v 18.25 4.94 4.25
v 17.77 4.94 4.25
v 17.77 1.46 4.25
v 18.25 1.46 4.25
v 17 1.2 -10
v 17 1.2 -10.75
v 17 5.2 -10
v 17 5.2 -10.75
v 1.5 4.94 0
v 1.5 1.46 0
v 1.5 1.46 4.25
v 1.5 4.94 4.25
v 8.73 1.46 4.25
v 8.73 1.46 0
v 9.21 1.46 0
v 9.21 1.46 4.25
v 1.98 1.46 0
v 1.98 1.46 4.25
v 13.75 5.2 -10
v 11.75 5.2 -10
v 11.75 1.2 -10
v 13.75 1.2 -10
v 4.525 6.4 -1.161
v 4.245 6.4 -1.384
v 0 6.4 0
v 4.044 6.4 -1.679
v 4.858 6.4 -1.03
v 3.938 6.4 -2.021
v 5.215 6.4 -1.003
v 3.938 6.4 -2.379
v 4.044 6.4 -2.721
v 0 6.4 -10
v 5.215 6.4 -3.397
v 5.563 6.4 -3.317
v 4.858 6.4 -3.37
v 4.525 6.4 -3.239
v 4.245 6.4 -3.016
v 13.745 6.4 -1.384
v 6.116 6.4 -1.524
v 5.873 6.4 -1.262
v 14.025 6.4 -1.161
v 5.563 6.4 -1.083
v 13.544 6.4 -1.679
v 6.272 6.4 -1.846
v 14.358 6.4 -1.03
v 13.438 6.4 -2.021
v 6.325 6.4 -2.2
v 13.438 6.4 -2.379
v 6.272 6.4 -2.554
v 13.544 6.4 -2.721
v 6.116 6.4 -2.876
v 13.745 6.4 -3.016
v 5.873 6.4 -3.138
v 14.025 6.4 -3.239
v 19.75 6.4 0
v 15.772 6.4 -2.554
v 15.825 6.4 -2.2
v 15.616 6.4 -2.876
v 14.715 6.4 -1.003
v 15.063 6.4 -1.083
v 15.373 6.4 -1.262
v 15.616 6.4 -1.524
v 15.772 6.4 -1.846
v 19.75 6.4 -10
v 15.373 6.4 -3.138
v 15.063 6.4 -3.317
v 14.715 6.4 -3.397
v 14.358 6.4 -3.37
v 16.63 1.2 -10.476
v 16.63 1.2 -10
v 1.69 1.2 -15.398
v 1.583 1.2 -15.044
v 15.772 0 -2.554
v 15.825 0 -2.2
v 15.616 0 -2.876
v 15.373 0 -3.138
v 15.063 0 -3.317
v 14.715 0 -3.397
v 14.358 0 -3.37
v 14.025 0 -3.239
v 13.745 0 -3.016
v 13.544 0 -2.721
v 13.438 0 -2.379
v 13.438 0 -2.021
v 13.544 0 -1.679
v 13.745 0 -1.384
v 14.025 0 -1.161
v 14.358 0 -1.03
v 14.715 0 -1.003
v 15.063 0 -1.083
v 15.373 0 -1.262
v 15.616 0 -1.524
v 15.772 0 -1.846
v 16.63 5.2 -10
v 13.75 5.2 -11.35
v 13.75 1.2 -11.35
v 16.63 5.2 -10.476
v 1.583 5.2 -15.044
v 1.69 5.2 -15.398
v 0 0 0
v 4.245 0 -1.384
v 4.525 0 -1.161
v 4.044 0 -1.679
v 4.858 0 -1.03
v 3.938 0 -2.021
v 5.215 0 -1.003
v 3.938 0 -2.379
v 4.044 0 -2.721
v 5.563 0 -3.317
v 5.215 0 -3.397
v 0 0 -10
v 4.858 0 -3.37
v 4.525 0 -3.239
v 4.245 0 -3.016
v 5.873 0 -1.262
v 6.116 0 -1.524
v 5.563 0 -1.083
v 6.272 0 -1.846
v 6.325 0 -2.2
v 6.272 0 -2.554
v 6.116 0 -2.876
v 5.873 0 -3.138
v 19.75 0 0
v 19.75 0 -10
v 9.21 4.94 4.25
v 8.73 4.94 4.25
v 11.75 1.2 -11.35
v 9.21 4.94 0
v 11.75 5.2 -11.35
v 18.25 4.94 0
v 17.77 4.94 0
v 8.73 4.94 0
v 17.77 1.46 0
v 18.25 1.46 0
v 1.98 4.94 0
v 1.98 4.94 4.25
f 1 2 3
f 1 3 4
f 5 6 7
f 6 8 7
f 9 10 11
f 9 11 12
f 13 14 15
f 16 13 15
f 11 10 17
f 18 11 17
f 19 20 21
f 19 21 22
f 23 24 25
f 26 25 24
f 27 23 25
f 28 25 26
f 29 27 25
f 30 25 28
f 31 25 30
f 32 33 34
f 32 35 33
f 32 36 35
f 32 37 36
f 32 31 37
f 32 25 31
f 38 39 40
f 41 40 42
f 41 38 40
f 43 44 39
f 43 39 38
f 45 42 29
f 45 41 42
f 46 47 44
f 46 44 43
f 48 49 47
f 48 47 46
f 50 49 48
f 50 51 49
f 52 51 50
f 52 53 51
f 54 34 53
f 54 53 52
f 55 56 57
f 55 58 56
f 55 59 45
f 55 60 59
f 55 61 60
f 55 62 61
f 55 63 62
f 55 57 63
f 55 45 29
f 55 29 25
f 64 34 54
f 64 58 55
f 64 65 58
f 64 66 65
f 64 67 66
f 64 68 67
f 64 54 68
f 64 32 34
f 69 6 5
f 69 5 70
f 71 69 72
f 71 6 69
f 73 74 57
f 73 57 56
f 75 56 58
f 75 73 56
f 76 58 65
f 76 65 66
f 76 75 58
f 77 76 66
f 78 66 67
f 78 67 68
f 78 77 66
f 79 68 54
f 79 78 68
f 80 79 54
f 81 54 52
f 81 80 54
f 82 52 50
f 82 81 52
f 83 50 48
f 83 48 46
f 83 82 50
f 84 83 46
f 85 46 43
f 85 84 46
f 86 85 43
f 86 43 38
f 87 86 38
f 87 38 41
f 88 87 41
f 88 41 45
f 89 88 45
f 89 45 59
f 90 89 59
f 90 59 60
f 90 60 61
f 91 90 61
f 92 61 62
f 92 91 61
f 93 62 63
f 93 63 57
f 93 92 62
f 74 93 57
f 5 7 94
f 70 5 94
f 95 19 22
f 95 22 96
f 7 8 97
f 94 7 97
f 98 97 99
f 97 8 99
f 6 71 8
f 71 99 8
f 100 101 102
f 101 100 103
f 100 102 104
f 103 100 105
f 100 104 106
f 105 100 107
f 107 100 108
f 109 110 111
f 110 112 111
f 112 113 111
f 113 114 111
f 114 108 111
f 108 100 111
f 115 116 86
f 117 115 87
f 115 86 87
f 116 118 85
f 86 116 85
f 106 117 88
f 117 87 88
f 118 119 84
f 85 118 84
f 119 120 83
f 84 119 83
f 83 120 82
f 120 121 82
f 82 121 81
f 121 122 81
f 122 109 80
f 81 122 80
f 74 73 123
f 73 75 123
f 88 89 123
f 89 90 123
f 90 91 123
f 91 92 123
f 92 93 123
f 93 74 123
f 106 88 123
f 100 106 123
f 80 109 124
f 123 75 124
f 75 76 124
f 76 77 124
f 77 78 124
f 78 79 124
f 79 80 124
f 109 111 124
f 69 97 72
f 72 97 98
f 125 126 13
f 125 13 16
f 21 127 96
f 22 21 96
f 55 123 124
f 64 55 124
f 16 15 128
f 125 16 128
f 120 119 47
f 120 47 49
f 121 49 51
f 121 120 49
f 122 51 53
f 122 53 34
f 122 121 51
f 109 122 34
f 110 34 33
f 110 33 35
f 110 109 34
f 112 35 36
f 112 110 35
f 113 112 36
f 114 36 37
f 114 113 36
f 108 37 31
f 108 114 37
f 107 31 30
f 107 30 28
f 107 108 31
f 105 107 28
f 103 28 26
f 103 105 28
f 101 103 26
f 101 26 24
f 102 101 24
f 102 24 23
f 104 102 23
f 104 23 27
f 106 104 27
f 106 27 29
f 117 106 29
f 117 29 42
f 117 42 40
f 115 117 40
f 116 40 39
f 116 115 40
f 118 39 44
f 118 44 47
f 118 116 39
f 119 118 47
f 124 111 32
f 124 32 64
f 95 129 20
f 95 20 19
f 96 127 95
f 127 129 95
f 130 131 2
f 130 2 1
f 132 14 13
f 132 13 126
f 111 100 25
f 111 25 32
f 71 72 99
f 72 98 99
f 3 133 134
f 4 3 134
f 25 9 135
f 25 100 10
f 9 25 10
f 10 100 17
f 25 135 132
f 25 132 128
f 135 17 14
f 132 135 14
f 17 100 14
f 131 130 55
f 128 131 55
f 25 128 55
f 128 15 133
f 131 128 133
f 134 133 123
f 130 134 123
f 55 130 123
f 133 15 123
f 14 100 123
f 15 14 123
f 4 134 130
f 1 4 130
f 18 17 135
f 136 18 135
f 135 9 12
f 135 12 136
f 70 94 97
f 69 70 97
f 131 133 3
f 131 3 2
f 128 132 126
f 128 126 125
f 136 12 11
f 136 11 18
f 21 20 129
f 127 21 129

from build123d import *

# Parameters (mm, degrees)
SKETCH2_W                  = 19.75
SKETCH2_H                  = 10
SKETCH2_R                  = 1.2
BOSS_EXTRUDE1_DEPTH        = 6.4
SKETCH3_W                  = 0.48
SKETCH3_H                  = 3.48
BOSS_EXTRUDE2_DEPTH        = 4.25
SKETCH4_W                  = 2
SKETCH4_H                  = 1.35
BOSS_EXTRUDE4_DEPTH        = 2
BOSS_EXTRUDE4_DEPTH_BACK   = 2
BOSS_EXTRUDE4_2_DEPTH      = 2
BOSS_EXTRUDE4_2_DEPTH_BACK = 2


with BuildPart() as part:
    # Sketch2 → Boss-Extrude1 (new body)
    with BuildSketch(Plane(origin=(0, 0, 0), x_dir=(1, 0, 0), z_dir=(0, 1, 0))):
        with Locations((9.875, 5)):
            Rectangle(SKETCH2_W, SKETCH2_H)
        with Locations((5.125, 2.2)):
            Circle(SKETCH2_R, mode=Mode.SUBTRACT)
        with Locations((14.625, 2.2)):
            Circle(SKETCH2_R, mode=Mode.SUBTRACT)
    extrude(amount=BOSS_EXTRUDE1_DEPTH)

    # Sketch3 → Boss-Extrude2 (add)
    with BuildSketch(Plane.XY):
        with Locations((1.74, 3.2)):
            Rectangle(SKETCH3_W, SKETCH3_H)
        with Locations((8.97, 3.2)):
            Rectangle(SKETCH3_W, SKETCH3_H)
        with Locations((18.01, 3.2)):
            Rectangle(SKETCH3_W, SKETCH3_H)
    extrude(amount=BOSS_EXTRUDE2_DEPTH)


with BuildPart() as body_2:
    # Sketch4 → Boss-Extrude4 (new body, two sides)
    with BuildSketch(Plane(origin=(0, 3.2, 0), x_dir=(1, 0, 0), z_dir=(0, 1, 0))) as boss_extrude4_sk:
        with Locations((12.75, 10.675)):
            Rectangle(SKETCH4_W, SKETCH4_H)
    extrude(amount=BOSS_EXTRUDE4_DEPTH)
    extrude(boss_extrude4_sk.sketch, amount=-BOSS_EXTRUDE4_DEPTH_BACK)


with BuildPart() as body_3:
    # Sketch4 → Boss-Extrude4 2 (new body, two sides)
    with BuildSketch(Plane(origin=(0, 3.2, 0), x_dir=(1, 0, 0), z_dir=(0, 1, 0))) as boss_extrude4_2_sk:
        Polygon((16.63, 10.475653818), (1.582515124, 15.04395623), (1.690000124, 15.397999977), (17, 10.75), (17, 10), (16.63, 10), align=None)
    extrude(amount=BOSS_EXTRUDE4_2_DEPTH)
    extrude(boss_extrude4_2_sk.sketch, amount=-BOSS_EXTRUDE4_2_DEPTH_BACK)


solid = Compound([part.part, body_2.part, body_3.part])
